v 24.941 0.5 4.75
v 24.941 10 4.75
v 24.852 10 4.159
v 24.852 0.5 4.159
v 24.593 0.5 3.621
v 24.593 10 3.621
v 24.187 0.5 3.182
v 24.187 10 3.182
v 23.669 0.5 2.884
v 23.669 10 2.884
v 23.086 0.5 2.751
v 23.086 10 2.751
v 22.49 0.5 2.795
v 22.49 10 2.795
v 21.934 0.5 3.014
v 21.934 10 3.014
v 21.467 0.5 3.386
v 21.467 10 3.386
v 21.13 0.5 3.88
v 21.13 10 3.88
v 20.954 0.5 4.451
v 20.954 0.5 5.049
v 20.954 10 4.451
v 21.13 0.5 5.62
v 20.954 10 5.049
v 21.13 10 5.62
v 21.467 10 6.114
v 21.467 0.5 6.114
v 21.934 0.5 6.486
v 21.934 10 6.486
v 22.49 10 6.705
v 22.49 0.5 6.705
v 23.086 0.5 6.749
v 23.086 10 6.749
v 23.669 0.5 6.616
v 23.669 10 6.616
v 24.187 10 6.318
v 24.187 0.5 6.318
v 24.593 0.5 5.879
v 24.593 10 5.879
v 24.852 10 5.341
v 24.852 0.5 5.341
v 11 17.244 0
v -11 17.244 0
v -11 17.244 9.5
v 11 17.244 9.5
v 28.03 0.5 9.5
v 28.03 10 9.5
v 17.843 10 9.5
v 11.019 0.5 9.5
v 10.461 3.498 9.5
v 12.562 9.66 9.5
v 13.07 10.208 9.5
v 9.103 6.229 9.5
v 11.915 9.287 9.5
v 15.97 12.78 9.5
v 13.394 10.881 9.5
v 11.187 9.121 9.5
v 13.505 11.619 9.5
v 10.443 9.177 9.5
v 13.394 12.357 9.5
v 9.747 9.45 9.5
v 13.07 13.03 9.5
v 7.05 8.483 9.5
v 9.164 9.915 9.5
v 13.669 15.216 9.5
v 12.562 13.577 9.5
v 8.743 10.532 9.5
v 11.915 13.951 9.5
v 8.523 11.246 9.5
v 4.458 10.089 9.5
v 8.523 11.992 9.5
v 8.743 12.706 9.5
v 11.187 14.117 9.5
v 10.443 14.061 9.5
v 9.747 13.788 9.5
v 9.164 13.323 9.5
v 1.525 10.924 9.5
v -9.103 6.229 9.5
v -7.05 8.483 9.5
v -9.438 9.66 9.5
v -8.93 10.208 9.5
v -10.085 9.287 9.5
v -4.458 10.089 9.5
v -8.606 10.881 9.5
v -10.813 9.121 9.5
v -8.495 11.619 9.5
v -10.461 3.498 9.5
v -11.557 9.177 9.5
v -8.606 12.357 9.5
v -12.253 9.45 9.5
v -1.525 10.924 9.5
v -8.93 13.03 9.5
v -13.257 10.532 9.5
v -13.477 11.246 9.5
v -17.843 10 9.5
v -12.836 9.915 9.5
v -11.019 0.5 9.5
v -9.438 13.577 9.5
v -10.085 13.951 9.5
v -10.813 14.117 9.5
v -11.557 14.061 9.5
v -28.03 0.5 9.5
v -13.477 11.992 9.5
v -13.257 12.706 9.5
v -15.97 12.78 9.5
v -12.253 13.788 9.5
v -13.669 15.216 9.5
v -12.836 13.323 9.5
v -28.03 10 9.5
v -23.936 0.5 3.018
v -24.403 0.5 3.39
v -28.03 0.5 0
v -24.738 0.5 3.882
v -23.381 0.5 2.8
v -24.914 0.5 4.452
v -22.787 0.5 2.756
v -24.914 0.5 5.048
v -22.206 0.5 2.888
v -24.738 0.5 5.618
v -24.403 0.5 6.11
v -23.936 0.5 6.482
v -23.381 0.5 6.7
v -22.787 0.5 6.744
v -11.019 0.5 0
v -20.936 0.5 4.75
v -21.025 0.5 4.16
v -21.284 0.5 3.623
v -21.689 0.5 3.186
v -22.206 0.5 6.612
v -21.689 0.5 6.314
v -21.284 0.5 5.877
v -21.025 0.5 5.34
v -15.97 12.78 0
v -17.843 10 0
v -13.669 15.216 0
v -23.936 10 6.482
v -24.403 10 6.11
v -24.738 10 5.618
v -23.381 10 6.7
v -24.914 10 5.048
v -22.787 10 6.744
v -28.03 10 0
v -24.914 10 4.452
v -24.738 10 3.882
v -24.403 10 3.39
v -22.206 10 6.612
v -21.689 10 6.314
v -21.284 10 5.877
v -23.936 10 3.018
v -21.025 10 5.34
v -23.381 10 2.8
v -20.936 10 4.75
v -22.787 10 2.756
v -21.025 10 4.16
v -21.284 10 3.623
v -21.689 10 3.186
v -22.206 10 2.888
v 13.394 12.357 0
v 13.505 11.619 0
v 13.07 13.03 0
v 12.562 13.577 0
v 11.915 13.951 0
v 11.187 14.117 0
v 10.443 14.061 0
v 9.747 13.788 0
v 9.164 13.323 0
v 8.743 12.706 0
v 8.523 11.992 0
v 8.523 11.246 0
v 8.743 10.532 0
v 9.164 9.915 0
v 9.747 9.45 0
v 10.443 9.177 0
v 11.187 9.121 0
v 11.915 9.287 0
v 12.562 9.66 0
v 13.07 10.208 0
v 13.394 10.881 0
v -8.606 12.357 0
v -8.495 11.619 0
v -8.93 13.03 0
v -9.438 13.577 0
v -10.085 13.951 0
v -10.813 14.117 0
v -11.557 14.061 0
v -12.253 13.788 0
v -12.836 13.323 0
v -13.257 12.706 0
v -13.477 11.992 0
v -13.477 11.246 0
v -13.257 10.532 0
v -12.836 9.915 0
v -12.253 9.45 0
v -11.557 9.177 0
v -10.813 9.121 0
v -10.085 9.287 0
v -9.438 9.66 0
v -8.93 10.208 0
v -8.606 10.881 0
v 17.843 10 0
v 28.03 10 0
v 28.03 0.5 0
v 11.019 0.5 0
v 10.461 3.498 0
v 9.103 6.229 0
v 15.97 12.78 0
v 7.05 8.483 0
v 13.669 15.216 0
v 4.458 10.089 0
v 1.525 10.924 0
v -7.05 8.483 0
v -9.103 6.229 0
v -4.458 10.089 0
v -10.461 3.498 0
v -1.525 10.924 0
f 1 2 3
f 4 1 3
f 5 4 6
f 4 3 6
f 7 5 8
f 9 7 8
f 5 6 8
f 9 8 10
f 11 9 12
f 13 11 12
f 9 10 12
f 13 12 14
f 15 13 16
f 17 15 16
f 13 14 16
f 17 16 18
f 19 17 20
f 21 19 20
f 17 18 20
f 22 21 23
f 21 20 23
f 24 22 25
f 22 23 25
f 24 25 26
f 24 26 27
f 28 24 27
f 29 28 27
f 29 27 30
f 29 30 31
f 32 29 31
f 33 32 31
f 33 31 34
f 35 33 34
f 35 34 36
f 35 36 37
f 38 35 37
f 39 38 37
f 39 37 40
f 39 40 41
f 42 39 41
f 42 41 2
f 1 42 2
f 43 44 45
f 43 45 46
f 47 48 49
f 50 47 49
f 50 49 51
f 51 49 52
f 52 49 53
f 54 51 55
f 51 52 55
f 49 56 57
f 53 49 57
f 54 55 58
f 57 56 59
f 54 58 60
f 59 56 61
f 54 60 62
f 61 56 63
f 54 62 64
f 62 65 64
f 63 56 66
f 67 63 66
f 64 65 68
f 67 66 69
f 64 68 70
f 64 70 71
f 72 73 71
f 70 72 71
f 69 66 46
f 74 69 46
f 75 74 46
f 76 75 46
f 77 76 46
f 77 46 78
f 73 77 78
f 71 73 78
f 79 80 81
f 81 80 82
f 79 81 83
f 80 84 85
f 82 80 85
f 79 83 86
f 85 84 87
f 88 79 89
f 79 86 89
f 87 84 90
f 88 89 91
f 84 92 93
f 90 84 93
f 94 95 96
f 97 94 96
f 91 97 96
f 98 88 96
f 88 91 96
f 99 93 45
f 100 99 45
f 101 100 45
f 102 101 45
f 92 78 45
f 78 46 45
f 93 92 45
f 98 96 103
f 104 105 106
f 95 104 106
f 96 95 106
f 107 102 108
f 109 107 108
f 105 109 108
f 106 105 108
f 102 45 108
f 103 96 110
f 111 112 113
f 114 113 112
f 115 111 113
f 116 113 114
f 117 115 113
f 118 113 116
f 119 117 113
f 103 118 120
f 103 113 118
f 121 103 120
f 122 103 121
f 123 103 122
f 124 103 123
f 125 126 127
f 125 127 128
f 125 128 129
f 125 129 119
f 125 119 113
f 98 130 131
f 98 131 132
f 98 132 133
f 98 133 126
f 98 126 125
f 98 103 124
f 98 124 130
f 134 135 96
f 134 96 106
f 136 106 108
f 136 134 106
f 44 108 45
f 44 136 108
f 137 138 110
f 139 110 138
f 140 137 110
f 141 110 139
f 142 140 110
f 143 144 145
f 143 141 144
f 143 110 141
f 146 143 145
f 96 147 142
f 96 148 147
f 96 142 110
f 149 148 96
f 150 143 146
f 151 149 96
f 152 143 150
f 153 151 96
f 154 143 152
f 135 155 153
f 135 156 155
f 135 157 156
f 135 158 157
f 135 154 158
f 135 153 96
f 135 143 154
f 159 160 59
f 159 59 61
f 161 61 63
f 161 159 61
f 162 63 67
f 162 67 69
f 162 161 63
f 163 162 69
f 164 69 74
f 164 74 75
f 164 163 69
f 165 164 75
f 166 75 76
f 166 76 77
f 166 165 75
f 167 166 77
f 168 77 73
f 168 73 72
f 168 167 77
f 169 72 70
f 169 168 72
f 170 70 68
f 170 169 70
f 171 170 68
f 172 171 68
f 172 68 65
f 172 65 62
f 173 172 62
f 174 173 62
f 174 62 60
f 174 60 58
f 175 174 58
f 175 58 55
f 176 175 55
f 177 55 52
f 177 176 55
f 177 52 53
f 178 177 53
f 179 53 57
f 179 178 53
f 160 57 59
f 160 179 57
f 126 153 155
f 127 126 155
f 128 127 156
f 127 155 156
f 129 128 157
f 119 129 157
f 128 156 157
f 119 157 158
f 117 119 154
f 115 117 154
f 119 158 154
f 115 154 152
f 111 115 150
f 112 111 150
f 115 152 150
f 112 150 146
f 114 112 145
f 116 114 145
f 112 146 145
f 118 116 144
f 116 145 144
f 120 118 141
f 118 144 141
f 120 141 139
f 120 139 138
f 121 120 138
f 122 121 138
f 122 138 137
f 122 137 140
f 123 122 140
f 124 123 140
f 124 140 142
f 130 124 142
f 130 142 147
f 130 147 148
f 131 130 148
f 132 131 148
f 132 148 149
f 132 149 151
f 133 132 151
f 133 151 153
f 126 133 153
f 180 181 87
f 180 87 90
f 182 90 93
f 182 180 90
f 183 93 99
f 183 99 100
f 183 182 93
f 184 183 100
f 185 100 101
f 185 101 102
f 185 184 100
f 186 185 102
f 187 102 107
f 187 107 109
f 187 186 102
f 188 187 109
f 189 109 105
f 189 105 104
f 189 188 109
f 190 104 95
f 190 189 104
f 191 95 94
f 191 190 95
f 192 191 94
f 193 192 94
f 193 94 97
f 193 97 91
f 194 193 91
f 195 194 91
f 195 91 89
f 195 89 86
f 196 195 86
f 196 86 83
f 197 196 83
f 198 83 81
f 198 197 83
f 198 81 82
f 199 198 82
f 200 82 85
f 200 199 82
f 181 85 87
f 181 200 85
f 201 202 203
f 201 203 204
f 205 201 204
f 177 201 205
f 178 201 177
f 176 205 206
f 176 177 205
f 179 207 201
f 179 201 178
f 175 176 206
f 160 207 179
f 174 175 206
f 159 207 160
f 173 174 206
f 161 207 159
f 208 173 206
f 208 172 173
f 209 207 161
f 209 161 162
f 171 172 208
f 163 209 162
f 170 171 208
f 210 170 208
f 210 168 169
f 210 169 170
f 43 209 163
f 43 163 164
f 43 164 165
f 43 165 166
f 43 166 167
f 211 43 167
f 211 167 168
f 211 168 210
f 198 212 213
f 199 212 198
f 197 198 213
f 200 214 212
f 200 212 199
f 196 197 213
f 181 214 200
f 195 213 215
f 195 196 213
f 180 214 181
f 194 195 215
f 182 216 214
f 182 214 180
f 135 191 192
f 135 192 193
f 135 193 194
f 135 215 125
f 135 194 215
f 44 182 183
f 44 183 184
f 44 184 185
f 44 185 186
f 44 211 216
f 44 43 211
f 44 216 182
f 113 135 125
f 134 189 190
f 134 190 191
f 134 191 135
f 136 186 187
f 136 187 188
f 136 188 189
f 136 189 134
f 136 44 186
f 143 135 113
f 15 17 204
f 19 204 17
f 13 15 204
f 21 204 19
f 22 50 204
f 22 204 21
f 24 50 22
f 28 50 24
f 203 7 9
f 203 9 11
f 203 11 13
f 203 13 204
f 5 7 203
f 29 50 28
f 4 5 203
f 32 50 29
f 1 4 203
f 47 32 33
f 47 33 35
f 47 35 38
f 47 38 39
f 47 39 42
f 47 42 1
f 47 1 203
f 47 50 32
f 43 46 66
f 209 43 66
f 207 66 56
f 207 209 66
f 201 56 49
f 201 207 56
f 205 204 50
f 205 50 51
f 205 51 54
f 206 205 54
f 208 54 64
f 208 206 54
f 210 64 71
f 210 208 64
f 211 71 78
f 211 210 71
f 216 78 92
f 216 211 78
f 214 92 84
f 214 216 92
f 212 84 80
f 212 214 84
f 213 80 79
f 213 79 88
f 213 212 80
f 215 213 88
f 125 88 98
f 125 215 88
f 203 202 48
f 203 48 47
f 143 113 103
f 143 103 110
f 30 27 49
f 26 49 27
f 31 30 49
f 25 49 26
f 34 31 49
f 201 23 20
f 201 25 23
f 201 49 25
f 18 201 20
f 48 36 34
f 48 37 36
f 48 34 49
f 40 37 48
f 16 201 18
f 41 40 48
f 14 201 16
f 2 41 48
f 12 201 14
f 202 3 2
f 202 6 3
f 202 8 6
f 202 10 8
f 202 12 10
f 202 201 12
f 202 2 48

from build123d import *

# Parameters (mm, degrees)
SKETCH1_R           = 2.505
BOSS_EXTRUDE2_DEPTH = 9.5
CUT_EXTRUDE1_REACH  = 12
SKETCH2_R           = 2.005
SKETCH2_R_2         = 2
SKETCH3_W           = 72.995776
SKETCH3_H           = 18.148858384
CUT_EXTRUDE2_DEPTH  = 0.5


with BuildPart() as part:
    # Sketch1 → Boss-Extrude2 (new body)
    with BuildSketch(Plane.XY):
        with BuildLine():
            Line((-11.03, 0), (-28.03, 0))
            Line((-28.03, 0), (-28.03, 10))
            Line((-28.03, 10), (-17.842887818, 10))
            ThreePointArc((-17.842887818, 10), (-14.869374743, 14.045296026), (-11, 17.244380119))
            Line((-11, 17.244380119), (11, 17.244380119))
            ThreePointArc((11, 17.244380119), (14.869374743, 14.045296026), (17.842887818, 10))
            Line((17.842887818, 10), (28.03, 10))
            Line((28.03, 10), (28.03, 0))
            Line((28.03, 0), (11.03, 0))
            ThreePointArc((11.03, 0), (0, 11.03), (-11.03, 0))
        make_face()
        with Locations((11, 11.618950039)):
            Circle(SKETCH1_R, mode=Mode.SUBTRACT)
        with Locations((-11, 11.618950039)):
            Circle(SKETCH1_R, mode=Mode.SUBTRACT)
    extrude(amount=BOSS_EXTRUDE2_DEPTH)

    # Sketch2 → Cut-Extrude1 (cut, up to next)
    with BuildSketch(Plane(origin=(0, 10, 0), x_dir=(1, 0, 0), z_dir=(0, 1, 0)), mode=Mode.PRIVATE) as cut_extrude1_sk1:
        with Locations((22.936443909, -4.75)):
            Circle(SKETCH2_R)
    cut_extrude1_tool1 = extrude(cut_extrude1_sk1.sketch, amount=-CUT_EXTRUDE1_REACH, mode=Mode.PRIVATE) & part.part
    add(cut_extrude1_tool1.solids().sort_by_distance((22.936444, 10, 4.75))[0], mode=Mode.SUBTRACT)
    # Sketch2 → Cut-Extrude1 (cut, up to next)
    with BuildSketch(Plane(origin=(0, 10, 0), x_dir=(1, 0, 0), z_dir=(0, 1, 0)), mode=Mode.PRIVATE) as cut_extrude1_sk2:
        with Locations((-22.936443909, -4.75)):
            Circle(SKETCH2_R_2)
    cut_extrude1_tool2 = extrude(cut_extrude1_sk2.sketch, amount=-CUT_EXTRUDE1_REACH, mode=Mode.PRIVATE) & part.part
    add(cut_extrude1_tool2.solids().sort_by_distance((-22.936444, 10, 4.75))[0], mode=Mode.SUBTRACT)

    # Sketch3 → Cut-Extrude2 (cut)
    with BuildSketch(Plane.XZ):
        with Locations((1.301113009, 1.807163247)):
            Rectangle(SKETCH3_W, SKETCH3_H)
    extrude(amount=-CUT_EXTRUDE2_DEPTH, mode=Mode.SUBTRACT)


solid = part.part
